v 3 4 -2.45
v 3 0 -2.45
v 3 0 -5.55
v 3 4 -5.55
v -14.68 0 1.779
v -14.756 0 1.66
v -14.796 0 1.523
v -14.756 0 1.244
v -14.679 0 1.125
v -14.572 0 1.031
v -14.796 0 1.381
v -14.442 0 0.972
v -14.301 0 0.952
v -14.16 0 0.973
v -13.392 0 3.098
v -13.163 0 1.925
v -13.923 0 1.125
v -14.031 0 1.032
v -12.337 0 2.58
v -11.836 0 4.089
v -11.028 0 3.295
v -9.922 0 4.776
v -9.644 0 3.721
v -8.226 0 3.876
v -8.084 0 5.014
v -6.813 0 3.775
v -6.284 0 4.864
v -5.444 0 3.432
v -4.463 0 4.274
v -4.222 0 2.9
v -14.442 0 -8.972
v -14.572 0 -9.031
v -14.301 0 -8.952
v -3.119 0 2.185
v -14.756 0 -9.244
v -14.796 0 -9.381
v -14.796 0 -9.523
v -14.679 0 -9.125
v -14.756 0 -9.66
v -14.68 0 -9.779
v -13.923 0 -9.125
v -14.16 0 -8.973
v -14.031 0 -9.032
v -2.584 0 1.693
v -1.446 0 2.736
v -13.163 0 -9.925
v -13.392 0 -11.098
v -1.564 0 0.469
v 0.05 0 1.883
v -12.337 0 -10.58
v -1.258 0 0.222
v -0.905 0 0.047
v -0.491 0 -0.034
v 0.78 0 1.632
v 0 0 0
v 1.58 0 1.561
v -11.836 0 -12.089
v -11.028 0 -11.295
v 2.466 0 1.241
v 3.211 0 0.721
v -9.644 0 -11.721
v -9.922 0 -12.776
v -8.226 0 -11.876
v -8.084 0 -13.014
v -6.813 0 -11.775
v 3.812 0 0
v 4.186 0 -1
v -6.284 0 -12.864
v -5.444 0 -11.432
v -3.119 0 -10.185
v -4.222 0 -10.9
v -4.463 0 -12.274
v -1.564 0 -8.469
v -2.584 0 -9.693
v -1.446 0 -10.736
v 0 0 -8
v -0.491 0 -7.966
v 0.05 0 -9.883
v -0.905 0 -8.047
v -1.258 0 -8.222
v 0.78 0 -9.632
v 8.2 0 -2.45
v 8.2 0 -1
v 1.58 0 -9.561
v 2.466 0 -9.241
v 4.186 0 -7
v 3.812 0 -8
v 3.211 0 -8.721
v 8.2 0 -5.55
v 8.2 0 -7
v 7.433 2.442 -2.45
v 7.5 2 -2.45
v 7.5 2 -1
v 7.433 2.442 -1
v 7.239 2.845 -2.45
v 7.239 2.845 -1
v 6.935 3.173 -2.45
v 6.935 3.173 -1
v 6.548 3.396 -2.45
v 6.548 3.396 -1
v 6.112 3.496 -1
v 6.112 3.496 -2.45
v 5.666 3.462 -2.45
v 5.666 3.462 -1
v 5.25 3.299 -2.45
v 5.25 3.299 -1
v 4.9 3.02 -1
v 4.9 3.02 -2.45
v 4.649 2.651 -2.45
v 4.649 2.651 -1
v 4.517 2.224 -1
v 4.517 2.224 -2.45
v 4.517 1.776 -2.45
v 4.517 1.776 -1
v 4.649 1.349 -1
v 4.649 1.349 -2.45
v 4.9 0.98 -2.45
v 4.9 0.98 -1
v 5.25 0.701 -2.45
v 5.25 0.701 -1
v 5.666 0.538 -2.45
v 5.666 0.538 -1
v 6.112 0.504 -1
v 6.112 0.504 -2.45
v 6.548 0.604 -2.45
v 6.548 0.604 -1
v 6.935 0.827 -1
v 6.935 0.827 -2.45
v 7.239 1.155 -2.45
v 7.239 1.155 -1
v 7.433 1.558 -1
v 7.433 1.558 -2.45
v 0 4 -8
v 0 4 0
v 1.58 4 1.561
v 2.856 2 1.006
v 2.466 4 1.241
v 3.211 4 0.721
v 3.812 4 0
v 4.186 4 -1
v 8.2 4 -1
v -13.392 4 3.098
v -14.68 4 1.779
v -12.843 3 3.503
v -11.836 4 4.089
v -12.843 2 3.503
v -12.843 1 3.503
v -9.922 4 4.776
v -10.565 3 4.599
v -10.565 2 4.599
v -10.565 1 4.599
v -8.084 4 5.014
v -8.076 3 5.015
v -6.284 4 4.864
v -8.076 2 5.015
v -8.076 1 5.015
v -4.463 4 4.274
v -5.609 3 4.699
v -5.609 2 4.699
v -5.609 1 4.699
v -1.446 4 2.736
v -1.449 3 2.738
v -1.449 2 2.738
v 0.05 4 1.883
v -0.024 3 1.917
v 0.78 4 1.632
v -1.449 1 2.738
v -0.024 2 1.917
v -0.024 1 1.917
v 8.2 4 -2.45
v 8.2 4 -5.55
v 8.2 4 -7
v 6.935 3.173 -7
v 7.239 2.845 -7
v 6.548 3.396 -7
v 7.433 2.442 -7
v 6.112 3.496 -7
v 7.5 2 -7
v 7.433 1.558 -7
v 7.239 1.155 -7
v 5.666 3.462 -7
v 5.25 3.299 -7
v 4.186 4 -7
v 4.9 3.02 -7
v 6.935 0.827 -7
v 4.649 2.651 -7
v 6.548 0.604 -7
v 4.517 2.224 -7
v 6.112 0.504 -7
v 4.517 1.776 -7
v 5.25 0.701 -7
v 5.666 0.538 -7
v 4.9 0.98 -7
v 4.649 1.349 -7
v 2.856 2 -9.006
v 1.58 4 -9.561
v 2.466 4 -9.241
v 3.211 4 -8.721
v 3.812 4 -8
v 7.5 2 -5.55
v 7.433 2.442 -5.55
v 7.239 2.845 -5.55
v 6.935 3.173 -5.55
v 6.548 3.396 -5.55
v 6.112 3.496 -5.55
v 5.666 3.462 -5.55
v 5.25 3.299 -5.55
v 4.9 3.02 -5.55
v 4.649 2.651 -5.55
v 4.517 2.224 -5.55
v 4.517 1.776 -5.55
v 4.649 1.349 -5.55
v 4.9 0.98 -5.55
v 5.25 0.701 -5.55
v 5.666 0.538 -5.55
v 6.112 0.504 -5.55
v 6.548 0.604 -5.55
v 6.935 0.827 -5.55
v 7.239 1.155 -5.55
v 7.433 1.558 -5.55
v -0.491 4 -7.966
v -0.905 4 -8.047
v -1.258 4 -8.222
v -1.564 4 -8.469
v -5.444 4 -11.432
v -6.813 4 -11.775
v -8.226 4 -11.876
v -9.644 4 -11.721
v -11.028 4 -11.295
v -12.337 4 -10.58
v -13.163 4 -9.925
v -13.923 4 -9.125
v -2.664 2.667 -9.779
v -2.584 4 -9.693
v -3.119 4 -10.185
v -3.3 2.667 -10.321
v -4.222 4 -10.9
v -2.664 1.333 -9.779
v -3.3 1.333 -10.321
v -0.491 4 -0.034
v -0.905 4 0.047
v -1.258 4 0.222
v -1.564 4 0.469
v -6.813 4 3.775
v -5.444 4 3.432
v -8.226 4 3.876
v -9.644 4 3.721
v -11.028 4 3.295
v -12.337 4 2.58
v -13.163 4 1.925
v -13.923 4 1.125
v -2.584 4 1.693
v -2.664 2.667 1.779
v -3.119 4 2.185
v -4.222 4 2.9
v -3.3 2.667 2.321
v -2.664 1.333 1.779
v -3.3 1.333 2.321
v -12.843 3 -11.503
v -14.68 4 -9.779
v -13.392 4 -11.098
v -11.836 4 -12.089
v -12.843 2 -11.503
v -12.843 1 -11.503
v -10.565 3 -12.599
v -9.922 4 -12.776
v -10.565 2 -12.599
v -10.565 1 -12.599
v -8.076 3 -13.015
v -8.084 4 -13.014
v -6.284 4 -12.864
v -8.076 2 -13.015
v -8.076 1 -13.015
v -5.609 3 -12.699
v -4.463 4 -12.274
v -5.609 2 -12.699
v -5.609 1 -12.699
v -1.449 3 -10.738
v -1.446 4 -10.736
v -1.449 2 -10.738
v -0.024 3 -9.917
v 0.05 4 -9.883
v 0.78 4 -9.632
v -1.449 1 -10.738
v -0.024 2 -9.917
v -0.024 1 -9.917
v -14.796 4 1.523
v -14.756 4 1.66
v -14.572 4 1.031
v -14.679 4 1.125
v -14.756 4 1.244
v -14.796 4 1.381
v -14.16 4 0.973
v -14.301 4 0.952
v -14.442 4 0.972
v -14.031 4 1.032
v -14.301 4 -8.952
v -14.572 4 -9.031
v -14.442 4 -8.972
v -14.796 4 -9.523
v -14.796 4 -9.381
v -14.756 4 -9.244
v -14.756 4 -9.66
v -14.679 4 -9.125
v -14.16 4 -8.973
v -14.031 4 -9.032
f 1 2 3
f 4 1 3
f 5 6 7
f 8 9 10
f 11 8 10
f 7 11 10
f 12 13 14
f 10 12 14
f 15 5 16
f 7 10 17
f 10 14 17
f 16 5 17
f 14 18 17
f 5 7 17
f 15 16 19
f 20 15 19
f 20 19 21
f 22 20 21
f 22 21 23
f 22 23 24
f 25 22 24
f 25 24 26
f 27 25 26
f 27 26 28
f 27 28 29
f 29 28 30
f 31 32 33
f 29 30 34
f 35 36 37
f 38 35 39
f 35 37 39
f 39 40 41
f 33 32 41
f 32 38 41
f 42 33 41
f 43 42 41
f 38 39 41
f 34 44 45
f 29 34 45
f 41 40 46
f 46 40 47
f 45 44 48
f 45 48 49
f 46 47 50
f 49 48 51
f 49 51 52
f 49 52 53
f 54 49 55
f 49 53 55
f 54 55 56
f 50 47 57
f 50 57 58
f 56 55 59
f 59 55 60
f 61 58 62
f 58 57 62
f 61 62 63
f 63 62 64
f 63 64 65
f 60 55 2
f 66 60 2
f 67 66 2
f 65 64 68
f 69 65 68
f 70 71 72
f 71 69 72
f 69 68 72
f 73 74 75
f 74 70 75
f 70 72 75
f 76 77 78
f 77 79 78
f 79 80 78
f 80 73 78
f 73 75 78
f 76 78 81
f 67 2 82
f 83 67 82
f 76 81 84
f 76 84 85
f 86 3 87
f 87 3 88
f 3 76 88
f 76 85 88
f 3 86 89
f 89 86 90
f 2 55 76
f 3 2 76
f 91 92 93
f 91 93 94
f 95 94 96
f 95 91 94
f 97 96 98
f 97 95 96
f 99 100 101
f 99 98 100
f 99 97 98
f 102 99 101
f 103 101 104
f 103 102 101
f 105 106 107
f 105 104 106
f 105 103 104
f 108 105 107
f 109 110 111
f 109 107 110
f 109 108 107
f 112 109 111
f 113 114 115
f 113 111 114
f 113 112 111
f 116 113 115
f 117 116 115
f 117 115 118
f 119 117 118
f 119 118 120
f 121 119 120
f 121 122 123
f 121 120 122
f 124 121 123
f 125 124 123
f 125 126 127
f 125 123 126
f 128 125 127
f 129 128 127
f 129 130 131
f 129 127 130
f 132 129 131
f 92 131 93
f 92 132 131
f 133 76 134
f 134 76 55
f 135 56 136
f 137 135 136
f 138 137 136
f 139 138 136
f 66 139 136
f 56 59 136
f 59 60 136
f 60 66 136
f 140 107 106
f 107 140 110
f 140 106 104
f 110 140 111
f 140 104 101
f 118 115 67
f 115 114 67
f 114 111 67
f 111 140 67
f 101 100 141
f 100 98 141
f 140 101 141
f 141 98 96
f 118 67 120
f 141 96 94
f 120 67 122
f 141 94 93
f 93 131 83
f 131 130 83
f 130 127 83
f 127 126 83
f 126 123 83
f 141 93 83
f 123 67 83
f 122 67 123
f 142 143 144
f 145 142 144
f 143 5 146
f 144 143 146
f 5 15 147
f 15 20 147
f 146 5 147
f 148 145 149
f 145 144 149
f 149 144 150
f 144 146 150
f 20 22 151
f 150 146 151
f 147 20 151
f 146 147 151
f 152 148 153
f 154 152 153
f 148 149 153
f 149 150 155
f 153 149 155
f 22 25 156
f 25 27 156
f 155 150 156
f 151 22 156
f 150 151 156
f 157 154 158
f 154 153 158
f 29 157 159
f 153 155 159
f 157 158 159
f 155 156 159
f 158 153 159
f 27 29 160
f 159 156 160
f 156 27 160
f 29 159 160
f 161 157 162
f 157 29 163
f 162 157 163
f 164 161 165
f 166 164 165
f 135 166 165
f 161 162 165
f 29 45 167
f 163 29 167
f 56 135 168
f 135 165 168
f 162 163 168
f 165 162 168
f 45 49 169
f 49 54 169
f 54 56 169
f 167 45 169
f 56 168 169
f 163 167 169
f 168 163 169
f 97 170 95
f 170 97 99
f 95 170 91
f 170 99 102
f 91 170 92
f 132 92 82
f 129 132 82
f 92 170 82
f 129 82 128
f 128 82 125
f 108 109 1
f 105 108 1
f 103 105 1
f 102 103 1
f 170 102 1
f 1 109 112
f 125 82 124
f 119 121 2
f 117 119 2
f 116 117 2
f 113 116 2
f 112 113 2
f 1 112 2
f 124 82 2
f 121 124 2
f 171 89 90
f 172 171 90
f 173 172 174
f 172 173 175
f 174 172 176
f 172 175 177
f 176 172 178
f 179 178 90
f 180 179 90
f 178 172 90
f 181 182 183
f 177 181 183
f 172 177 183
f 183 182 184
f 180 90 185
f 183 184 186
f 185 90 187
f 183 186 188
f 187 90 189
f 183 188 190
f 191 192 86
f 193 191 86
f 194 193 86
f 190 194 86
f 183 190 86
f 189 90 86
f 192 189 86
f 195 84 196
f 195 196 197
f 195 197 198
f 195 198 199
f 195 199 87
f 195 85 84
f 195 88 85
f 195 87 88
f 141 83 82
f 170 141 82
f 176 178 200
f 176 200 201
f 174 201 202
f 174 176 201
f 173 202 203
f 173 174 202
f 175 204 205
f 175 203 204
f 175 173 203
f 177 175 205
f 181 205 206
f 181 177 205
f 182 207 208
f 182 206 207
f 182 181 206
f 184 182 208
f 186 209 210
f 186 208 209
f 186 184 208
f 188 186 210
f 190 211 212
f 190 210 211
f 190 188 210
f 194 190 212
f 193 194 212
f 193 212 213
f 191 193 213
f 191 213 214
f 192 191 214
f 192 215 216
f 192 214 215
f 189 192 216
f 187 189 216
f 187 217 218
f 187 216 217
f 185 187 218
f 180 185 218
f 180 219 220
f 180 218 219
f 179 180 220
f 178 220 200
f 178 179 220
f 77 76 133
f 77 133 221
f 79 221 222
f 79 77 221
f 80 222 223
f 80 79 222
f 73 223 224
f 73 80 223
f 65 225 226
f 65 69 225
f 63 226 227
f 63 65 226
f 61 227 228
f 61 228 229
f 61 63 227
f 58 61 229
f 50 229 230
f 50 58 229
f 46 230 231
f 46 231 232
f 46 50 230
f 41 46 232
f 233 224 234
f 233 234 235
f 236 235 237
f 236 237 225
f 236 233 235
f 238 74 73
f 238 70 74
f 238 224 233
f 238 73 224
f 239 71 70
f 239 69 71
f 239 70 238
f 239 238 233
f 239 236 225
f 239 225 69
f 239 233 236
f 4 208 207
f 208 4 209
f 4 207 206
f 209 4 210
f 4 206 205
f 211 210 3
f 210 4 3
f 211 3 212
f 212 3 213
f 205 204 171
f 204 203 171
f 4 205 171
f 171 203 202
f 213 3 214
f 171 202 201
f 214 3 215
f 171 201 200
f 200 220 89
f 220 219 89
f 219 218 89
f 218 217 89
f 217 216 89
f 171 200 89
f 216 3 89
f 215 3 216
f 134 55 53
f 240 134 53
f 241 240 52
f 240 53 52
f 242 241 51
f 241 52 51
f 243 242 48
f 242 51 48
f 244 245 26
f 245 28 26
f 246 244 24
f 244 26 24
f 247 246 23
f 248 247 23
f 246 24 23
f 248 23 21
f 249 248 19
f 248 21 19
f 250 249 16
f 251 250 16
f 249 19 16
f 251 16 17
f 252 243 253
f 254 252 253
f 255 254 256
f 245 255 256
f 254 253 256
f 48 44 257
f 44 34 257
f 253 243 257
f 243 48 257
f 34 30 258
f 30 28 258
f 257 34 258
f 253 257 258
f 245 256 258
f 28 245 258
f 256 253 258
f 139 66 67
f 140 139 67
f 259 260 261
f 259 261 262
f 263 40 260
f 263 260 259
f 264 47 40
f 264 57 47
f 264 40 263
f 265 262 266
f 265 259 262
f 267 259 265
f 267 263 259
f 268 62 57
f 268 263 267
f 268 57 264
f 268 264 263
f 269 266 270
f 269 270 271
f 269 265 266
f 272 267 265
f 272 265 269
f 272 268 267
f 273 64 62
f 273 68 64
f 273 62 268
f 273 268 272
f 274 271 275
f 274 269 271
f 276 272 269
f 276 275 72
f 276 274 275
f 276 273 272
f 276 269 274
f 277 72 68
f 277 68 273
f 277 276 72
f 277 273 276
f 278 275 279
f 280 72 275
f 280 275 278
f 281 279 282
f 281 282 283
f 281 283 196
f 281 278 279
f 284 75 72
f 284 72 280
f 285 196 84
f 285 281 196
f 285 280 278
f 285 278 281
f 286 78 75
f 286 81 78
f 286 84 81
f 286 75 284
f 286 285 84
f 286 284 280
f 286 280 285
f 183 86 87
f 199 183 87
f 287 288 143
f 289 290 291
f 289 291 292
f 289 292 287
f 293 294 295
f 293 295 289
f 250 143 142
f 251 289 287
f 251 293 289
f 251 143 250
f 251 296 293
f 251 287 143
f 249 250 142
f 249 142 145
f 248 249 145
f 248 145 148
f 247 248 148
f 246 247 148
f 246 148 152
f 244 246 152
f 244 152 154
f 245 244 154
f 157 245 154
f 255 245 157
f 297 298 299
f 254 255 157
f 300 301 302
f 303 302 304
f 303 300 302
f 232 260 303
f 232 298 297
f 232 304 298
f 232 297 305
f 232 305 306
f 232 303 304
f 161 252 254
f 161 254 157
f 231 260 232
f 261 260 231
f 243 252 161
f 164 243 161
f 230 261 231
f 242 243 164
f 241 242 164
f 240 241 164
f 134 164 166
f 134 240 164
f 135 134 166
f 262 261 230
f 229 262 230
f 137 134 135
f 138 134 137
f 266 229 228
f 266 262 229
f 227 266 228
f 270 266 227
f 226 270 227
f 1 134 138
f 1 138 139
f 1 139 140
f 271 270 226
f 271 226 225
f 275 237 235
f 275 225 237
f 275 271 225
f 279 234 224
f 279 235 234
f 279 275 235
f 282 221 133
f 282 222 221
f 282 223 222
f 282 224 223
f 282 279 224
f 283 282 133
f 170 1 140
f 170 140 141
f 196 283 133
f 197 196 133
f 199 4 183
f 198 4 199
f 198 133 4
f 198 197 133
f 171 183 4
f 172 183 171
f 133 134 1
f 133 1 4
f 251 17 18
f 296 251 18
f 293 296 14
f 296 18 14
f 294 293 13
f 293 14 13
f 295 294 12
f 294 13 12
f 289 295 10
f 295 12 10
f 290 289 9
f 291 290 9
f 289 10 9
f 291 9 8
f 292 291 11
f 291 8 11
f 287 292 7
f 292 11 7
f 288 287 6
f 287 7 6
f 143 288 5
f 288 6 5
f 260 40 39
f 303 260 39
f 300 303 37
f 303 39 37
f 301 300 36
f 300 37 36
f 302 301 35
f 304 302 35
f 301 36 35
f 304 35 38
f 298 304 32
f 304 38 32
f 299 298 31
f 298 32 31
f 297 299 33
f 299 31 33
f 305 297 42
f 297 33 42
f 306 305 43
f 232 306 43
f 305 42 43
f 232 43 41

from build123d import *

# Parameters (mm, degrees)
BOSS_EXTRUDE1_DEPTH = 4
SKETCH2_R           = 1.5
CUT_EXTRUDE1_DEPTH  = 10


with BuildPart() as part:
    # Sketch1 → Boss-Extrude1 (new body)
    with BuildSketch(Plane(origin=(0, 0, 0), x_dir=(1, 0, 0), z_dir=(0, 1, 0))):
        with BuildLine():
            Line((0, 8), (0, 0))
            add(Edge.make_bspline(
                [(0, 0), (-1.444972113, 0.268364939), (-1.989778669, -1.274793611), (-5.99641862, -4.532476754), (-11.043579326, -4.596412752), (-13.923421089, -1.125163293)],
                knots=[0, 0, 0, 0, 0.216898357, 0.270831116, 1, 1, 1, 1], degree=3))
            ThreePointArc((-13.923421089, -1.125163293), (-14.628689505, -1.074207804), (-14.679644993, -1.77947622))
            add(Edge.make_bspline(
                [(-14.679644993, -1.77947622), (-12.628894453, -4.474080979), (-7.714296312, -5.95140451), (-3.34534031, -3.74006244), (-1.005631641, -2.560185408), (0.394595325, -1.501153093), (1.579778317, -1.560661502)],
                knots=[0, 0, 0, 0, 0.557352672, 0.711946673, 0.815566185, 1, 1, 1, 1], degree=3))
            add(Edge.make_bspline(
                [(1.579778317, -1.560661502), (3.016371883, -1.23196193), (3.812496302, 0)],
                knots=[0, 0, 0, 1, 1, 1], degree=2))
            Line((3.812496302, 0), (4.185828994, 1))
            Line((4.185828994, 1), (8.2, 1))
            Line((8.2, 1), (8.2, 2.45))
            Line((8.2, 2.45), (3, 2.45))
            Line((3, 2.45), (3, 5.55))
            Line((3, 5.55), (8.2, 5.55))
            Line((8.2, 5.55), (8.2, 7))
            Line((8.2, 7), (4.185828994, 7))
            Line((4.185828994, 7), (3.812496302, 8))
            add(Edge.make_bspline(
                [(1.579778317, 9.560661502), (3.016371883, 9.23196193), (3.812496302, 8)],
                knots=[0, 0, 0, 1, 1, 1], degree=2))
            add(Edge.make_bspline(
                [(-14.679644993, 9.77947622), (-12.628894453, 12.474080979), (-7.714296312, 13.95140451), (-3.34534031, 11.74006244), (-1.005631641, 10.560185408), (0.394595325, 9.501153093), (1.579778317, 9.560661502)],
                knots=[0, 0, 0, 0, 0.557352672, 0.711946673, 0.815566185, 1, 1, 1, 1], degree=3))
            ThreePointArc((-14.679644993, 9.77947622), (-14.628689505, 9.074207804), (-13.923421089, 9.125163293))
            add(Edge.make_bspline(
                [(0, 8), (-1.444972113, 7.731635061), (-1.989778669, 9.274793611), (-5.99641862, 12.532476754), (-11.043579326, 12.596412752), (-13.923421089, 9.125163293)],
                knots=[0, 0, 0, 0, 0.216898357, 0.270831116, 1, 1, 1, 1], degree=3))
        make_face()
    extrude(amount=BOSS_EXTRUDE1_DEPTH)

    # Sketch2 → Cut-Extrude1 (cut)
    with BuildSketch(Plane.XY.offset(-8)):
        with Locations((6, 2)):
            Circle(SKETCH2_R)
    extrude(amount=CUT_EXTRUDE1_DEPTH, mode=Mode.SUBTRACT)


solid = part.part
